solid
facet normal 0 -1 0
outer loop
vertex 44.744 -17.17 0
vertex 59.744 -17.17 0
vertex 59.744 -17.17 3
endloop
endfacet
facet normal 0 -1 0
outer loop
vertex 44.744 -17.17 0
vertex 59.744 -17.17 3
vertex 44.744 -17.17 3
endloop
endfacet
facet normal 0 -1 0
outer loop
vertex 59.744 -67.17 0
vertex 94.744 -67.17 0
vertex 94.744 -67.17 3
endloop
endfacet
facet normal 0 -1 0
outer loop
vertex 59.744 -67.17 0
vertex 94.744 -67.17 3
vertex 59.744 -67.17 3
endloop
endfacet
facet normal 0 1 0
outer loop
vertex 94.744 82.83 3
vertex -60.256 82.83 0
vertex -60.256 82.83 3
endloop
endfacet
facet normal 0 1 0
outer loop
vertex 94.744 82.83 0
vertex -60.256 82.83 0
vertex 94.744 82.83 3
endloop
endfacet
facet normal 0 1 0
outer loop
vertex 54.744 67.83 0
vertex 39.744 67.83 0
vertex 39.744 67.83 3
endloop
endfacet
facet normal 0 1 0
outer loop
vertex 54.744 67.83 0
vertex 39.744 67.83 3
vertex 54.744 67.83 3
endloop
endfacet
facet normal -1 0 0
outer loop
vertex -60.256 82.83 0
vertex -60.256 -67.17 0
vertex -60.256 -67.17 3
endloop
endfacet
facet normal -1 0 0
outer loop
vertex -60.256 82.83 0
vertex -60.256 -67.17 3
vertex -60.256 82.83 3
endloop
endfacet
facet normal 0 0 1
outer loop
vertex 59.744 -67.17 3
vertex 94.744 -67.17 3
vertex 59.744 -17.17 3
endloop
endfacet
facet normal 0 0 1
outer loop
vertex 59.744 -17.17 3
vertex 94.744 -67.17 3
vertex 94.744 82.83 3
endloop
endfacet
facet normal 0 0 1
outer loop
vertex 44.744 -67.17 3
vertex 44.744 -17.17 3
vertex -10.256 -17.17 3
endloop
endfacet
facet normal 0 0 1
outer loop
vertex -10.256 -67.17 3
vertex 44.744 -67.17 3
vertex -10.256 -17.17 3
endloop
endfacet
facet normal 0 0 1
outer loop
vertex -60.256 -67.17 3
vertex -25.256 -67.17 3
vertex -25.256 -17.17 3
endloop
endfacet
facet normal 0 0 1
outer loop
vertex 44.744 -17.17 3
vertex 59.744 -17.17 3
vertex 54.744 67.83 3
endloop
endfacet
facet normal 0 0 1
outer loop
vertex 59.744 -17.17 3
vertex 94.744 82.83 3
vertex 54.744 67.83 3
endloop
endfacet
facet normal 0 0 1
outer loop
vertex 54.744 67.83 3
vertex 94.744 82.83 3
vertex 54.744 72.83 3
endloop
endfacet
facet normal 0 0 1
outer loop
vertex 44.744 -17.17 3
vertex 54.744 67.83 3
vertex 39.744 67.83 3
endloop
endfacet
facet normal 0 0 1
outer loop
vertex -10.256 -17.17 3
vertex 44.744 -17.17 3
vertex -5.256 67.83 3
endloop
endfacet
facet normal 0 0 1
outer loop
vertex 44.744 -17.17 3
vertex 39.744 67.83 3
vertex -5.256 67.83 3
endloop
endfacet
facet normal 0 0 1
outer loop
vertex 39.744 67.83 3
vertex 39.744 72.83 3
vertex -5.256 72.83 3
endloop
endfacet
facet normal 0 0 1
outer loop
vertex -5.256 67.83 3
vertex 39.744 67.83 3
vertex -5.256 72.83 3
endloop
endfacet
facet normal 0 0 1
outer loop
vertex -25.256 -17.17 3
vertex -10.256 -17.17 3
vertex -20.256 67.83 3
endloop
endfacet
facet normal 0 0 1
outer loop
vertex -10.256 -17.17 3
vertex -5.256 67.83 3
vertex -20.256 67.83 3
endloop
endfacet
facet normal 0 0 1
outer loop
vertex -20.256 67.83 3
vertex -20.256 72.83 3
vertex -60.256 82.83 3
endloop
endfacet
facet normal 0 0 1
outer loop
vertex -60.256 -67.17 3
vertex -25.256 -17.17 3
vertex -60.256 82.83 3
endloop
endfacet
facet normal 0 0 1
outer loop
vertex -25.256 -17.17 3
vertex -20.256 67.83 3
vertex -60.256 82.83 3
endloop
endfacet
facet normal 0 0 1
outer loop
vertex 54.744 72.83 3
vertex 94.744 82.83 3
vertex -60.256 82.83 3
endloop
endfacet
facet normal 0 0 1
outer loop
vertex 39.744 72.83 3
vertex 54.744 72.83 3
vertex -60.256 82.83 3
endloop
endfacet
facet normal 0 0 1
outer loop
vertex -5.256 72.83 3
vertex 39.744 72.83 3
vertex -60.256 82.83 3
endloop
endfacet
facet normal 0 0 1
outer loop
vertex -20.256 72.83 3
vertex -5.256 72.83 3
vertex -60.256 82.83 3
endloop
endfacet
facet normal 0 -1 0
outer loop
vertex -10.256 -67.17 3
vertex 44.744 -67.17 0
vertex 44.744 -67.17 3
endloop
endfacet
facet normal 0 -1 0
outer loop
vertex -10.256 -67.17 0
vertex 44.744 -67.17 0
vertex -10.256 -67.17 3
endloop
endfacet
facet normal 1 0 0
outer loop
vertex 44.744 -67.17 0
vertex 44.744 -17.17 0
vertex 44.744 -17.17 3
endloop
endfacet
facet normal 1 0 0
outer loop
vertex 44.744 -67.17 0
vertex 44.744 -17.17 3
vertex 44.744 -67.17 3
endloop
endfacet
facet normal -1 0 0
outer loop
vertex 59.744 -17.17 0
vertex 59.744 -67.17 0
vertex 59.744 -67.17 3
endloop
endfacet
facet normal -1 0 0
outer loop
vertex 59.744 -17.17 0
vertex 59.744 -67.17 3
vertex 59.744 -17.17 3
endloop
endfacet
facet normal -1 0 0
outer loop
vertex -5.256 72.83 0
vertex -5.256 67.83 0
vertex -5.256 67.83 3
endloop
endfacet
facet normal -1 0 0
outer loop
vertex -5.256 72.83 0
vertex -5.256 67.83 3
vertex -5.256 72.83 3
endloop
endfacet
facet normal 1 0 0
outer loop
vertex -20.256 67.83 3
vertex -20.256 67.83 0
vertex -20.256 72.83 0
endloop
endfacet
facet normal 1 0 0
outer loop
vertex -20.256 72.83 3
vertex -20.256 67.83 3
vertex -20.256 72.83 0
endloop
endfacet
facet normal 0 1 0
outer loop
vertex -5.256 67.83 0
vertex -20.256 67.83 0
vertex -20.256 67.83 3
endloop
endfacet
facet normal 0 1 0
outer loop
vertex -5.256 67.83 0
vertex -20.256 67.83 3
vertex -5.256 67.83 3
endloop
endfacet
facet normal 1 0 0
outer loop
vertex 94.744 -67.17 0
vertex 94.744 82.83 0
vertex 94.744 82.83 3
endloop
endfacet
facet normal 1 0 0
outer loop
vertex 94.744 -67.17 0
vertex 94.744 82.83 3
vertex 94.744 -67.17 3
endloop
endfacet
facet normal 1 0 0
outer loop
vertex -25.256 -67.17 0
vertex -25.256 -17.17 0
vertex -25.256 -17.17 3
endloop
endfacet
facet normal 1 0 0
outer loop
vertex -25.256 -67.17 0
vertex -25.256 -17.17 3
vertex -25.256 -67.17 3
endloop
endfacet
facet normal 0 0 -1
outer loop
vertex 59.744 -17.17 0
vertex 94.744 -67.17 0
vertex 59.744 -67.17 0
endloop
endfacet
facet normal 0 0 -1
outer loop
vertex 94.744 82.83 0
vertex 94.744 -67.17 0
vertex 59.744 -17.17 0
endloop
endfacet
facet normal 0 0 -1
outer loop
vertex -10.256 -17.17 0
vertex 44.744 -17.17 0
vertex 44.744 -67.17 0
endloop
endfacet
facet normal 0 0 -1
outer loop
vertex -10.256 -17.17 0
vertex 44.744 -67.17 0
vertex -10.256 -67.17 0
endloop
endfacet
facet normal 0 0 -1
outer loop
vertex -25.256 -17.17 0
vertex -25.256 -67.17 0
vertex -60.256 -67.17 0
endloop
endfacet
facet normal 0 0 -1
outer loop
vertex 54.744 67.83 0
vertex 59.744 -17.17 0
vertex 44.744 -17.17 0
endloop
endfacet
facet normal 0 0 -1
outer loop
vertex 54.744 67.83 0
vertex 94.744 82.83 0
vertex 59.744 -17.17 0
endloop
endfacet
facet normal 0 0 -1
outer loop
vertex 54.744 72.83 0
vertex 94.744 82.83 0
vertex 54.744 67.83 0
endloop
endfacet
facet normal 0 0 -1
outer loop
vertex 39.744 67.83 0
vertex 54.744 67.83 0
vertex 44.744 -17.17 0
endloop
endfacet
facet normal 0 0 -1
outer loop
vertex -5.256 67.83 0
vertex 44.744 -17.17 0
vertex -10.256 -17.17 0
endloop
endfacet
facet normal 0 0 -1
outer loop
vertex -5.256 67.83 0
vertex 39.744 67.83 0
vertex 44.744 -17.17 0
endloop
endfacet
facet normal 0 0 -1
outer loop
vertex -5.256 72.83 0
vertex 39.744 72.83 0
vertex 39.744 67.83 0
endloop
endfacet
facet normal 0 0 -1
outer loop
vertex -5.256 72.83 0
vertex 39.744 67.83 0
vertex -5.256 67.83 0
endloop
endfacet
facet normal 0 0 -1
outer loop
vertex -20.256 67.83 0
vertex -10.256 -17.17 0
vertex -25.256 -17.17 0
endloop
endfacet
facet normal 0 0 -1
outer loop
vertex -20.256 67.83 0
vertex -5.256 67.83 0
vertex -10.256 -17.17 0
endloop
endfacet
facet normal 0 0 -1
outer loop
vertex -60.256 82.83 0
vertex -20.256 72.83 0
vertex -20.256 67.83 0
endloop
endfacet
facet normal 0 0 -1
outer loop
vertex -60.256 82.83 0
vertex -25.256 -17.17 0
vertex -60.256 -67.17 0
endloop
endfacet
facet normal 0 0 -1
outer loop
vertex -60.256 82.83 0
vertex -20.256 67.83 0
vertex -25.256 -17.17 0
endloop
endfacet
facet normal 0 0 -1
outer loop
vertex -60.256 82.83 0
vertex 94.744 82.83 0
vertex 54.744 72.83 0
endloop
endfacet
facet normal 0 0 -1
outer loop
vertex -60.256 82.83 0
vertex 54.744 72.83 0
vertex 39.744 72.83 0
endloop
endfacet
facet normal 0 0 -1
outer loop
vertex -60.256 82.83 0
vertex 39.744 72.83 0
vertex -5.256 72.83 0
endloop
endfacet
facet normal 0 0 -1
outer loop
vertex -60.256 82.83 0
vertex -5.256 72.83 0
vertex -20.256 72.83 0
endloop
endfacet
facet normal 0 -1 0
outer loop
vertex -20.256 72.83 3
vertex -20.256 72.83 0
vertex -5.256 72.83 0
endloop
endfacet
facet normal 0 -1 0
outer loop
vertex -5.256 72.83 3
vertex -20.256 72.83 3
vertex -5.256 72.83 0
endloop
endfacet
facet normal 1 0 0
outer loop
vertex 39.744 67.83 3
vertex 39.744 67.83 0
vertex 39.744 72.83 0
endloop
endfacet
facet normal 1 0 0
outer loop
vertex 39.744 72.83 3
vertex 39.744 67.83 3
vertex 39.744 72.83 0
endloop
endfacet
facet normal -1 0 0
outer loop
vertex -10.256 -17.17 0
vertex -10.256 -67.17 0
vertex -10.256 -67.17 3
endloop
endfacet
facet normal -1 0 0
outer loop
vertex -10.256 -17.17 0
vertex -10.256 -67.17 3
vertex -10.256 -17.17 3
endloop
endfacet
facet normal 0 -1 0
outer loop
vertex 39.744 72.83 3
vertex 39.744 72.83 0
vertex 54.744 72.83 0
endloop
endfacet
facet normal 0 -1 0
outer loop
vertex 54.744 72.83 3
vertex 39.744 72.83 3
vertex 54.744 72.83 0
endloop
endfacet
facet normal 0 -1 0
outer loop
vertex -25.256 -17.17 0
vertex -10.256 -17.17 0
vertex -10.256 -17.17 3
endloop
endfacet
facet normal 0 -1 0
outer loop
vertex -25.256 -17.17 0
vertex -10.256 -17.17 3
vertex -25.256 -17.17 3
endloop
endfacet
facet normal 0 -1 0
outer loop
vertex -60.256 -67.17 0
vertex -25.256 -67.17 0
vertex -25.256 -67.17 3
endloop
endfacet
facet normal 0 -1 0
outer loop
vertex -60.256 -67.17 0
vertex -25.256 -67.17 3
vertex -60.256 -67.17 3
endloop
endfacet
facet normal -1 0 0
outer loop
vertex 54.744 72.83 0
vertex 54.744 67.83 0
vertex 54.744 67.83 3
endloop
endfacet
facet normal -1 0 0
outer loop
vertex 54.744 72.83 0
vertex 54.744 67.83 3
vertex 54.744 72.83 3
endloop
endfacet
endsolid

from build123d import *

# Parameters (mm, degrees)
SKETCH_W  = 15
SKETCH_H  = 5
PAD_DEPTH = 3


with BuildPart() as part:
    # Sketch → Pad (new body)
    with BuildSketch(Plane.XY):
        Polygon((-60.255625, 82.82953), (94.744375, 82.82953), (94.744375, -67.17047), (59.744375, -67.17047), (59.744375, -17.17047), (44.744375, -17.17047), (44.744375, -67.17047), (-10.255625, -67.17047), (-10.255625, -17.17047), (-25.255625, -17.17047), (-25.255625, -67.17047), (-60.255625, -67.17047), align=None)
        with Locations((-12.755625, 70.32953)):
            Rectangle(SKETCH_W, SKETCH_H, mode=Mode.SUBTRACT)
        with Locations((47.244375, 70.32953)):
            Rectangle(SKETCH_W, SKETCH_H, mode=Mode.SUBTRACT)
    extrude(amount=PAD_DEPTH)


solid = part.part
